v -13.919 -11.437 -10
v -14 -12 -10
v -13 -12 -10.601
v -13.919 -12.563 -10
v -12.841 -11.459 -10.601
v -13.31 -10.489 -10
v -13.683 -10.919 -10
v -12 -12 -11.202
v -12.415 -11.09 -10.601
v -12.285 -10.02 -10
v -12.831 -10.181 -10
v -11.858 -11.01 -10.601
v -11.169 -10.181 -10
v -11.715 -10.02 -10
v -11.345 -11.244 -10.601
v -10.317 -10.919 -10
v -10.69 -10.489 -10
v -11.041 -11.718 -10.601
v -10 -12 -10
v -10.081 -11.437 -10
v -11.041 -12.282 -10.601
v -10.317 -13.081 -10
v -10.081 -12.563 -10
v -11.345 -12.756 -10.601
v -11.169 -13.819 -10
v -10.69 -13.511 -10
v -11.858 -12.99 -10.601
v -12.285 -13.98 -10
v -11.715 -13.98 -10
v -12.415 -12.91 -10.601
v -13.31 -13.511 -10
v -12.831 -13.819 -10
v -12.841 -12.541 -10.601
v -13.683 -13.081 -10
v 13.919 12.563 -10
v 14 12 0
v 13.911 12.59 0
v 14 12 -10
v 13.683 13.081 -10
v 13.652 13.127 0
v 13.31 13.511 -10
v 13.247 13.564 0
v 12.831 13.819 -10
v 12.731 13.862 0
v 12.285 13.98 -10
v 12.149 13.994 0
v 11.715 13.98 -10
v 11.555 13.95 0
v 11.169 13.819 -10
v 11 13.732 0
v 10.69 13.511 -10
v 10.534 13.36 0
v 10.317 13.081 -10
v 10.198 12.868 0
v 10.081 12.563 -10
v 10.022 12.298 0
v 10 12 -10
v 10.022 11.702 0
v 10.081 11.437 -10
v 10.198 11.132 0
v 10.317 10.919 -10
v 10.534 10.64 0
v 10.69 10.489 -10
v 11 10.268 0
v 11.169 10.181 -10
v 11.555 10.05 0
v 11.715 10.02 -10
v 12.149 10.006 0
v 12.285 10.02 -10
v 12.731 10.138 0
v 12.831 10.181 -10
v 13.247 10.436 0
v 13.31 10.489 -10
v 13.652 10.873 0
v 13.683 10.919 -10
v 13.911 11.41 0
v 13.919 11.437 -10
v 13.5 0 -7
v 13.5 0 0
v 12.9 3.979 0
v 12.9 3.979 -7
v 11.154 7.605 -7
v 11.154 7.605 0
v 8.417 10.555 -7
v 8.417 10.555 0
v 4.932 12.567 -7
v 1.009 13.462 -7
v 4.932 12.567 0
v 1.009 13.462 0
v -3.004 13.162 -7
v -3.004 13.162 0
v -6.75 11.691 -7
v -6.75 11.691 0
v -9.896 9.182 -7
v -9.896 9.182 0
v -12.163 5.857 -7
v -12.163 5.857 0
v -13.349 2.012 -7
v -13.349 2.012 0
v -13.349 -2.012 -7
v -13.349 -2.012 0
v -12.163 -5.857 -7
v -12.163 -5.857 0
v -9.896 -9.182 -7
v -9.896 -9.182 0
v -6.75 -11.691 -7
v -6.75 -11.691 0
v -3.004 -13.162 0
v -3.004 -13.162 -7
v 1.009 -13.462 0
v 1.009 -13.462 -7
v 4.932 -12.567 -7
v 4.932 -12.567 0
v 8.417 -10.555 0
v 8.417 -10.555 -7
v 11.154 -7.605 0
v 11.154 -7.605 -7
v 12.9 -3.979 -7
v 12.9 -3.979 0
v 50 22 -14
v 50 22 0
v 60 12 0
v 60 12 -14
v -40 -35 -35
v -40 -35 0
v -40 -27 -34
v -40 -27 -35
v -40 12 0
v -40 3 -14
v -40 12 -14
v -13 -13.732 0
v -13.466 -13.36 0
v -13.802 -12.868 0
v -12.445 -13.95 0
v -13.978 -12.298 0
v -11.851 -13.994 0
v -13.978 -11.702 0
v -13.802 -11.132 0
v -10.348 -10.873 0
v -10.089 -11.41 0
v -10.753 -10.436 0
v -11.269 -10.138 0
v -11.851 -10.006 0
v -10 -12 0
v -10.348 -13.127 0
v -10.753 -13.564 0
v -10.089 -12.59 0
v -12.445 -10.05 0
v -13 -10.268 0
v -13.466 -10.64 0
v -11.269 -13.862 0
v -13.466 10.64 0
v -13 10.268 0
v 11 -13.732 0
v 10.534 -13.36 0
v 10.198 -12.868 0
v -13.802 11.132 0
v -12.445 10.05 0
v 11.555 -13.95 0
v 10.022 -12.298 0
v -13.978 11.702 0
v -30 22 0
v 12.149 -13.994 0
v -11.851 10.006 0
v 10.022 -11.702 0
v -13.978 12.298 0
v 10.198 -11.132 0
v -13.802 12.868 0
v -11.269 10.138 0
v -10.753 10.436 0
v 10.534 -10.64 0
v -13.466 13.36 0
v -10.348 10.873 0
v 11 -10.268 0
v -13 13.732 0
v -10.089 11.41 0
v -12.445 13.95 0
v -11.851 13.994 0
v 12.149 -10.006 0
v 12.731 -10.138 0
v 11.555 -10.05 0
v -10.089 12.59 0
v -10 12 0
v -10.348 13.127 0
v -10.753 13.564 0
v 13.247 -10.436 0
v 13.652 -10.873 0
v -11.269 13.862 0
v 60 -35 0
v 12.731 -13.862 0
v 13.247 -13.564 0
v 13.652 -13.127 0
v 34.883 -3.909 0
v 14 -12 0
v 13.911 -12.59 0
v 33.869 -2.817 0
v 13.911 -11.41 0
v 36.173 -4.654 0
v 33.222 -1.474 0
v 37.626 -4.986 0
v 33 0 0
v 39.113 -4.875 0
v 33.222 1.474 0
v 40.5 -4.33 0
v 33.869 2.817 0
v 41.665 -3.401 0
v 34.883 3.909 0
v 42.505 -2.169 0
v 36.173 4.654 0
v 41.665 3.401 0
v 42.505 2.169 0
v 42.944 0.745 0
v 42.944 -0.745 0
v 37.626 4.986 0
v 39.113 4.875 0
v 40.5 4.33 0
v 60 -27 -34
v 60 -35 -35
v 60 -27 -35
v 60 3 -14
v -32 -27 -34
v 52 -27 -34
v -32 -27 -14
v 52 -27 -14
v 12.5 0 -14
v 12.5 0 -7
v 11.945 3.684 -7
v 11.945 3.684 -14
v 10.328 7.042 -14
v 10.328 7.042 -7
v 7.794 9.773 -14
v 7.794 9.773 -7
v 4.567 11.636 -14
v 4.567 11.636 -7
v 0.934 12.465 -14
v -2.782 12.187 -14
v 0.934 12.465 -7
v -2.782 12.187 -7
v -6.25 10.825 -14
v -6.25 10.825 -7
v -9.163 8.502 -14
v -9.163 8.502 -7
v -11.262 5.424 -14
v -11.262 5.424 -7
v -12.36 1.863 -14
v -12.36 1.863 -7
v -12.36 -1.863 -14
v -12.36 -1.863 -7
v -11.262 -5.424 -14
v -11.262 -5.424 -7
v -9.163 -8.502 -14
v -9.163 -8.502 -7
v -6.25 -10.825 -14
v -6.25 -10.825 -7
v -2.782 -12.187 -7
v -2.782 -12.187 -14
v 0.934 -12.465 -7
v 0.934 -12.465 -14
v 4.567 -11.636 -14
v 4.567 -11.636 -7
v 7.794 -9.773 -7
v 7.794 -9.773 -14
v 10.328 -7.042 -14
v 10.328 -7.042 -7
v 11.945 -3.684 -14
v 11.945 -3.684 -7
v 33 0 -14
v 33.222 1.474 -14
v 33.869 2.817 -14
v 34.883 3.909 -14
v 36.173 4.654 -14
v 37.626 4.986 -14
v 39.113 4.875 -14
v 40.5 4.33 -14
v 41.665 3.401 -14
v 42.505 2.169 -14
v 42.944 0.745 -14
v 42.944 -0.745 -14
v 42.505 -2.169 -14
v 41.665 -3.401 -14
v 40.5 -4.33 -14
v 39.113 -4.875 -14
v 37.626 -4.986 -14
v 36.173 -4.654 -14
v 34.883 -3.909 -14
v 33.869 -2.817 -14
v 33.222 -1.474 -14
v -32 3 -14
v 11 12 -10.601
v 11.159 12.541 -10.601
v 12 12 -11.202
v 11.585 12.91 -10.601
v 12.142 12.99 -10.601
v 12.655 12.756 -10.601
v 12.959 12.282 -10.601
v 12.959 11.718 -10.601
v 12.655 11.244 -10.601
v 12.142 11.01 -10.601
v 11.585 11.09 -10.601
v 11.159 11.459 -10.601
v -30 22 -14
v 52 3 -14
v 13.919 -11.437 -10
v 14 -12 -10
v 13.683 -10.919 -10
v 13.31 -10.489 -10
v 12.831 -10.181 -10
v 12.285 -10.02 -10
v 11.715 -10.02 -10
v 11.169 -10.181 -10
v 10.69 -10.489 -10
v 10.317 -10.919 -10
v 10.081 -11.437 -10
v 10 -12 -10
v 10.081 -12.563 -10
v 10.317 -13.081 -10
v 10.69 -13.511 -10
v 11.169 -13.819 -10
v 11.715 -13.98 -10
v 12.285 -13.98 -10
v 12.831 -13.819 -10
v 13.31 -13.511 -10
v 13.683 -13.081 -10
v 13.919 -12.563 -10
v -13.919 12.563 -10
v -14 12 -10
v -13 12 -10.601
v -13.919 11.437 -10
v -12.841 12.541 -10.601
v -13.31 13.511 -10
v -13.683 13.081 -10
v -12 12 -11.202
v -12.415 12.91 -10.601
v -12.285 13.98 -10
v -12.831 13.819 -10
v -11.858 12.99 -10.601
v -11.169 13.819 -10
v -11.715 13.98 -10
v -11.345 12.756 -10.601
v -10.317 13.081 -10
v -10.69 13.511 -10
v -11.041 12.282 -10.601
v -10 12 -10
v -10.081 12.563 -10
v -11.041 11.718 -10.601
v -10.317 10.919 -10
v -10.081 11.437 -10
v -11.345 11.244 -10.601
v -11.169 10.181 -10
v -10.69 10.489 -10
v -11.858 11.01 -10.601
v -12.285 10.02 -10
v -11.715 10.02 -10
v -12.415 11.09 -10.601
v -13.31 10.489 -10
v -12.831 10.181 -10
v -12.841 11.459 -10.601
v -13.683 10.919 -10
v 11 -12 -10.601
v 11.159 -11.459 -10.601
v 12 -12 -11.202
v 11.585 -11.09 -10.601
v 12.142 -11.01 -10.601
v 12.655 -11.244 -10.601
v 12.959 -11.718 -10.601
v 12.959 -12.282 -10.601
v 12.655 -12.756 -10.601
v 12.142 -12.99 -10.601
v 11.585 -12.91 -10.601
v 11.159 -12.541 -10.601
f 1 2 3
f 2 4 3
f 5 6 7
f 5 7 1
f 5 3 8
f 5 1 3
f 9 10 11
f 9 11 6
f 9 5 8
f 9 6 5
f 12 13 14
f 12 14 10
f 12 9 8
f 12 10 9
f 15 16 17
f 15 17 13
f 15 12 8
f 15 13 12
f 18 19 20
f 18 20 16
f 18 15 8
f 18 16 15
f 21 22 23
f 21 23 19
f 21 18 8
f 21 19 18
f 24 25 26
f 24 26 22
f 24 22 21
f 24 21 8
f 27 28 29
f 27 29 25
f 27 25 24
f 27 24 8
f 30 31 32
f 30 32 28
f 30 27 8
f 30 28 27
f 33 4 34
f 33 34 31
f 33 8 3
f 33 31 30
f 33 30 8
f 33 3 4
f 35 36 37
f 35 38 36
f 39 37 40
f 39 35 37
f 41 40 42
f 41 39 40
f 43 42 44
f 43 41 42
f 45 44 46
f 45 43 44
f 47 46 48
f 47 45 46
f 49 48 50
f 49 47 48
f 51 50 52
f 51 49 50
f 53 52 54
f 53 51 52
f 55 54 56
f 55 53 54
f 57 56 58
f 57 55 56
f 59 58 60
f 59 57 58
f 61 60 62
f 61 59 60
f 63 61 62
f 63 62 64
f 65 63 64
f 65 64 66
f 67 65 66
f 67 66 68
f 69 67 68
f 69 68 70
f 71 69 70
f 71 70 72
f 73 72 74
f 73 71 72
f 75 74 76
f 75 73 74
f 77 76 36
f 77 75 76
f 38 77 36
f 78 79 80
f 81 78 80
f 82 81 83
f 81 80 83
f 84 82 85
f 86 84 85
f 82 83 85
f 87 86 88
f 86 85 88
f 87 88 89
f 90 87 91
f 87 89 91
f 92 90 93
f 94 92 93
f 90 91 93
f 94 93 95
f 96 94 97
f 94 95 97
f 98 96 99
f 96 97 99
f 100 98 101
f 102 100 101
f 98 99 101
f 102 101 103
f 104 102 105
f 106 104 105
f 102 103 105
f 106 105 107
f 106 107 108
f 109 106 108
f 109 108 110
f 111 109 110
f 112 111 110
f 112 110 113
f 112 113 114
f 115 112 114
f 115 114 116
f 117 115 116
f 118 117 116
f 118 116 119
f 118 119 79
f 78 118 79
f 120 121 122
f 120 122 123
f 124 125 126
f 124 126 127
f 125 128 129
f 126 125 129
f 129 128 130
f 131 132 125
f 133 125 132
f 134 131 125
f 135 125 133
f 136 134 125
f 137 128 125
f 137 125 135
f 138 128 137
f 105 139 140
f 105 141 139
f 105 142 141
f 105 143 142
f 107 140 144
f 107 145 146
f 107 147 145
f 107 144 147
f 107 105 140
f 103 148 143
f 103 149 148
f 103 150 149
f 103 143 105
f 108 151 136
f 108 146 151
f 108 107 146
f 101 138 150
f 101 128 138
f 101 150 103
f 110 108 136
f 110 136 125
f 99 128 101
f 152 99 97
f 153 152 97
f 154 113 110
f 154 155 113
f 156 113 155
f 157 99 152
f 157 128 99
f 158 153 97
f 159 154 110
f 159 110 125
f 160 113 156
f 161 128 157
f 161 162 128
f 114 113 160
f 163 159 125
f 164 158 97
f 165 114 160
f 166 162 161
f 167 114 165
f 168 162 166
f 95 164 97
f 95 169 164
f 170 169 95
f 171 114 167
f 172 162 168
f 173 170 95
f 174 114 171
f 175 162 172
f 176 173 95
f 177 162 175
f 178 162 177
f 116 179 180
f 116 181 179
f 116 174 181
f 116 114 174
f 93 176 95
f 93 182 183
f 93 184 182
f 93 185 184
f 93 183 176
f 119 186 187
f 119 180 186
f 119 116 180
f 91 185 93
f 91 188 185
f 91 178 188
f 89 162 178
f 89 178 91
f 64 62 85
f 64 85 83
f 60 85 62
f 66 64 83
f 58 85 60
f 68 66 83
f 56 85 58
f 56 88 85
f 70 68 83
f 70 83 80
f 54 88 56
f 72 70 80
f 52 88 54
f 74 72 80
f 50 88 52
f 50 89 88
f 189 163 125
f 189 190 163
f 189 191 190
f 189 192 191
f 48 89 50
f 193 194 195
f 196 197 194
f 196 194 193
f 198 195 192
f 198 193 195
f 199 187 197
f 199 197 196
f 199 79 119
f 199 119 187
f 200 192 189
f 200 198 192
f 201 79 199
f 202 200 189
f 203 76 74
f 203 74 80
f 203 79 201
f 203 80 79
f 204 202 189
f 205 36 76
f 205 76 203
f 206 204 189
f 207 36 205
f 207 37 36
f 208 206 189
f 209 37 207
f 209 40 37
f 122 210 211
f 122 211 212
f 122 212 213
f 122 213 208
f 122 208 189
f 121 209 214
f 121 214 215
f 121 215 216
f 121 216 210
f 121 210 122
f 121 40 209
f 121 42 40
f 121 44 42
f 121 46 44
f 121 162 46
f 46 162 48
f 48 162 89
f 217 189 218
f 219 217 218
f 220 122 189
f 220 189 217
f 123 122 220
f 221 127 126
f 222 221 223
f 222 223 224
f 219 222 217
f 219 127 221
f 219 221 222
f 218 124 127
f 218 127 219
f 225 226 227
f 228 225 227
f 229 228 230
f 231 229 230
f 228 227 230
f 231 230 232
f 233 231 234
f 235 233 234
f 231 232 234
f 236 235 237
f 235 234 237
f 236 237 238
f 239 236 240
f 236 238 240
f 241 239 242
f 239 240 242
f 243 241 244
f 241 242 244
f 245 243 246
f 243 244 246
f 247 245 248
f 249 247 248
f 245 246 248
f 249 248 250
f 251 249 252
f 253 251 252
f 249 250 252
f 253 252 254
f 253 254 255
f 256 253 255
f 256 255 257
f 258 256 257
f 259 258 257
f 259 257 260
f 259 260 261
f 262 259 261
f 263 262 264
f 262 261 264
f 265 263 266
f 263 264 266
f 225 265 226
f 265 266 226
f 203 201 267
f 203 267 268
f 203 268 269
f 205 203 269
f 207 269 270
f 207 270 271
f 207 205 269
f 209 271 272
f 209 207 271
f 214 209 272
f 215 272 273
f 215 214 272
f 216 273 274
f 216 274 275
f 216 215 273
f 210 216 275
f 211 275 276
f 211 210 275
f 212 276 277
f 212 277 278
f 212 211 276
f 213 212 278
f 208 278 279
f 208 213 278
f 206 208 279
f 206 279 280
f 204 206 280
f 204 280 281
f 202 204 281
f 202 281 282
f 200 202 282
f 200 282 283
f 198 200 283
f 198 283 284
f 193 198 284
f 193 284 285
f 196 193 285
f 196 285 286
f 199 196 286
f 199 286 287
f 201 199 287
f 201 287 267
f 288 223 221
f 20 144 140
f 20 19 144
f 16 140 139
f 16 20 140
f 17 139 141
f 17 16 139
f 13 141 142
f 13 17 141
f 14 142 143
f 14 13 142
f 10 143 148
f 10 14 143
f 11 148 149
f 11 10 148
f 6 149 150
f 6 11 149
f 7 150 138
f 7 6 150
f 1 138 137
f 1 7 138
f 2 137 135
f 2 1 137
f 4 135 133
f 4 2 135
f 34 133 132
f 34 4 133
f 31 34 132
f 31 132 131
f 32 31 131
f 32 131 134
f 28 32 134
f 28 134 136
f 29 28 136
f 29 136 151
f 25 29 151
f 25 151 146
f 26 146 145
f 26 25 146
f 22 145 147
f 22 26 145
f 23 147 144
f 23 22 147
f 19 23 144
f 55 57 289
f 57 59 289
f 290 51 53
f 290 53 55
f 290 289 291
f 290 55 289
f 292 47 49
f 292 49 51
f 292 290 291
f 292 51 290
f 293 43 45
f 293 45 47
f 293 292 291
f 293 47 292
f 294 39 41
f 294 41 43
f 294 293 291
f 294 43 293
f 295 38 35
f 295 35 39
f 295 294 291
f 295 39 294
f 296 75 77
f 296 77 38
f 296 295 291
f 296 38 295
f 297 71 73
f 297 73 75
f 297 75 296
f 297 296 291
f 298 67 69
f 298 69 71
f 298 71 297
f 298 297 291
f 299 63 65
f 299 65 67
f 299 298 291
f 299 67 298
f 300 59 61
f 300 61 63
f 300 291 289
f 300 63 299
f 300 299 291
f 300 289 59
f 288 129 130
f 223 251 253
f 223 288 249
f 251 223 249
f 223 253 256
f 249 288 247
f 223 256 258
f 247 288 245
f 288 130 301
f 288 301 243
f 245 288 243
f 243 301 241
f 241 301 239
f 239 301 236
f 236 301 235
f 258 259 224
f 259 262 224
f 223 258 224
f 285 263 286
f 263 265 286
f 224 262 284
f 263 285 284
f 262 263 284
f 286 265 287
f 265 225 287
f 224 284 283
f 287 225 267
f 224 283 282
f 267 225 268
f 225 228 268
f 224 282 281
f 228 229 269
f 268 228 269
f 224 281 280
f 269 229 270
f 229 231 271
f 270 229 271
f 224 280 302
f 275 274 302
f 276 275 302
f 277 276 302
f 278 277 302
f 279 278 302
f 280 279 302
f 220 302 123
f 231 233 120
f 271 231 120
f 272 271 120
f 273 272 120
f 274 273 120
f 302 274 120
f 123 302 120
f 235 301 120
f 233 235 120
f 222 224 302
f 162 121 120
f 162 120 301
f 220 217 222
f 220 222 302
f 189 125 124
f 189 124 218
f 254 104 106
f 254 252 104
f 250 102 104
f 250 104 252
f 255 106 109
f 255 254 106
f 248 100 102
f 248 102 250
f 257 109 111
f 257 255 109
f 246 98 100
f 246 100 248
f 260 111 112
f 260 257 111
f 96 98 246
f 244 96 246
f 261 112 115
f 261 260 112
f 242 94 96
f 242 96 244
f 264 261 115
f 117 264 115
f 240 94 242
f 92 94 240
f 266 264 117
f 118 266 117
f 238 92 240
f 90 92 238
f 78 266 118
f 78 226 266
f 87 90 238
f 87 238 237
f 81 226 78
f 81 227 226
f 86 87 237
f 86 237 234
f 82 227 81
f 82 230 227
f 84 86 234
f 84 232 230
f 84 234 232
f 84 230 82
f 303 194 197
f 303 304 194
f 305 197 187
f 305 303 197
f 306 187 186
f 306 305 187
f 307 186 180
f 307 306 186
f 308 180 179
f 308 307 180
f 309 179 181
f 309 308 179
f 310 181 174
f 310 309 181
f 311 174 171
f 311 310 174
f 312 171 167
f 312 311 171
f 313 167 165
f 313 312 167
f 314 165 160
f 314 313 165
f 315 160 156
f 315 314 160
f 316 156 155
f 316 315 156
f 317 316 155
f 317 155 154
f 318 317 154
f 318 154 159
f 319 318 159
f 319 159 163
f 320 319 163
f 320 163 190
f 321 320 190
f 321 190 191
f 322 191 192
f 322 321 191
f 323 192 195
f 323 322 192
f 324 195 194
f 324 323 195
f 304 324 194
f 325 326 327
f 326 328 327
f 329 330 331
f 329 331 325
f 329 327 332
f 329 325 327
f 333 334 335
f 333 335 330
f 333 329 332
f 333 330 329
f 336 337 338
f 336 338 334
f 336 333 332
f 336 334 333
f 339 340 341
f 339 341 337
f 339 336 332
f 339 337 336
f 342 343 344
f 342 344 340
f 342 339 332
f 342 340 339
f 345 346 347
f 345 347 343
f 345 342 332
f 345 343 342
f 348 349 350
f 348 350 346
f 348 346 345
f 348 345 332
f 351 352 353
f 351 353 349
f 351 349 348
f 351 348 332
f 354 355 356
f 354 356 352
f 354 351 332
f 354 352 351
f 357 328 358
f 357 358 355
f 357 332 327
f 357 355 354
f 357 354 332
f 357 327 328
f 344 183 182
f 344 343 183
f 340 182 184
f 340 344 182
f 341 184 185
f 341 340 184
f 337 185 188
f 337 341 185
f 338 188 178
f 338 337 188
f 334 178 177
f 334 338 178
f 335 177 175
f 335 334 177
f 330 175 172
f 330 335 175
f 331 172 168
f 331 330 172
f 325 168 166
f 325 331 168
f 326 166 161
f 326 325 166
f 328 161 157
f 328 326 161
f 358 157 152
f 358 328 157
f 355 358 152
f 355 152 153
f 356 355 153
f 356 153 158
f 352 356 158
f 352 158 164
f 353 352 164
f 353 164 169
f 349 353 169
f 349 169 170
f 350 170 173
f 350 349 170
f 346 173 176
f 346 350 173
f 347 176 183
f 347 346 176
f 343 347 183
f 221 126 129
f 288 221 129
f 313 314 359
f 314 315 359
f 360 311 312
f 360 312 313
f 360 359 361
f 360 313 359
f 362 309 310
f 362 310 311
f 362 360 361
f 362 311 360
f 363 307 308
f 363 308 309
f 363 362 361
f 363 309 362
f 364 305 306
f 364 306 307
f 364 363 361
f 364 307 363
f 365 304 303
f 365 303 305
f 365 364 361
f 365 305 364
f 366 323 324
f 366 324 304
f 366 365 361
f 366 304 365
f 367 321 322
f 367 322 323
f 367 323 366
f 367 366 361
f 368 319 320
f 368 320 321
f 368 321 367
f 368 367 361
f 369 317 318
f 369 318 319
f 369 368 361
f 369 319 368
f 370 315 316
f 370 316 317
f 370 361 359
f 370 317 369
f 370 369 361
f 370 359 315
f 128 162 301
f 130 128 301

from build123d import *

# Parameters (mm, degrees)
SKETCH1_R                 = 13.5
BOSS_EXTRUDE1_DEPTH       = 14
BOSS_EXTRUDE2_START       = -7
SKETCH2_R                 = 13.5
SKETCH2_R_2               = 12.5
BOSS_EXTRUDE2_DEPTH       = 7
SKETCH16_W                = 100
SKETCH16_H                = 35
BOSS_EXTRUDE3_DEPTH       = 8
BOSS_EXTRUDE4_DEPTH       = 8
F_4_0MM_DOWEL_HOLE1_D     = 4
F_4_0MM_DOWEL_HOLE1_DEPTH = 10
F_4_0MM_DOWEL_HOLE1_TIP   = 1.201721238
SKETCH15_R                = 5
CUT_EXTRUDE1_DEPTH        = 78.781745931
CHAMFER1_SIZE             = 10


with BuildPart() as part:
    # Sketch1 → Boss-Extrude1 (new body)
    with BuildSketch(Plane.XY):
        Polygon((-40, -8), (-40, -35), (60, -35), (60, 3.080013472), (60, 22), (-40, 22), align=None)
        Circle(SKETCH1_R, mode=Mode.SUBTRACT)
    extrude(amount=BOSS_EXTRUDE1_DEPTH)

    # Sketch2 → Boss-Extrude2 (add)
    with BuildSketch(Plane.XY.offset(14).offset(BOSS_EXTRUDE2_START)):
        Circle(SKETCH2_R)
        Circle(SKETCH2_R_2, mode=Mode.SUBTRACT)
    extrude(amount=BOSS_EXTRUDE2_DEPTH)

    # Sketch16 → Boss-Extrude3 (add)
    with BuildSketch(Plane.XZ.offset(35)):
        with Locations((10, 17.5)):
            Rectangle(SKETCH16_W, SKETCH16_H)
    extrude(amount=-BOSS_EXTRUDE3_DEPTH)

    # Sketch17 → Boss-Extrude4 (add)
    with BuildSketch(Plane(origin=(60, 0, 0), x_dir=(0, 0, -1), z_dir=(1, 0, 0))):
        Polygon((-34, -27), (-14, 3), (-14, -27), align=None)
    boss_extrude4 = extrude(amount=-BOSS_EXTRUDE4_DEPTH)

    # Mirror1: Boss-Extrude4 across plane
    add(boss_extrude4.mirror(Plane(origin=(10, 0, 0), x_dir=(0, 0, 1), z_dir=(1, 0, 0))))

    # Ø4.0mm Dowel Hole1
    with Locations(Plane(origin=(0, 0, 0), x_dir=(-1, 0, 0), z_dir=(0, 0, -1))):
        with Locations((-12, 12), (12, 12), (12, -12), (-12, -12)):
            Hole(F_4_0MM_DOWEL_HOLE1_D / 2, depth=F_4_0MM_DOWEL_HOLE1_DEPTH)
            with Locations((0, 0, -(F_4_0MM_DOWEL_HOLE1_DEPTH + F_4_0MM_DOWEL_HOLE1_TIP / 2))):  # 118° drill point
                Cone(0, F_4_0MM_DOWEL_HOLE1_D / 2, F_4_0MM_DOWEL_HOLE1_TIP, mode=Mode.SUBTRACT)

    # Sketch15 → Cut-Extrude1 (cut, through all)
    with BuildSketch(Plane(origin=(0, 0, 0), x_dir=(-1, 0, 0), z_dir=(0, 0, -1))):
        with Locations((-38, 0)):
            Circle(SKETCH15_R)
    extrude(amount=-CUT_EXTRUDE1_DEPTH, mode=Mode.SUBTRACT)


with BuildPart() as body_2:
    # Mirror2: mirrored copy
    add(part.part.mirror(Plane.XY))

    # Chamfer1
    chamfer1_edges = [body_2.edges().sort_by_distance(p)[0] for p in [
        (-40, 22, -7),
        (60, 22, -7),
    ]]
    chamfer(chamfer1_edges, length=CHAMFER1_SIZE)


solid = body_2.part
